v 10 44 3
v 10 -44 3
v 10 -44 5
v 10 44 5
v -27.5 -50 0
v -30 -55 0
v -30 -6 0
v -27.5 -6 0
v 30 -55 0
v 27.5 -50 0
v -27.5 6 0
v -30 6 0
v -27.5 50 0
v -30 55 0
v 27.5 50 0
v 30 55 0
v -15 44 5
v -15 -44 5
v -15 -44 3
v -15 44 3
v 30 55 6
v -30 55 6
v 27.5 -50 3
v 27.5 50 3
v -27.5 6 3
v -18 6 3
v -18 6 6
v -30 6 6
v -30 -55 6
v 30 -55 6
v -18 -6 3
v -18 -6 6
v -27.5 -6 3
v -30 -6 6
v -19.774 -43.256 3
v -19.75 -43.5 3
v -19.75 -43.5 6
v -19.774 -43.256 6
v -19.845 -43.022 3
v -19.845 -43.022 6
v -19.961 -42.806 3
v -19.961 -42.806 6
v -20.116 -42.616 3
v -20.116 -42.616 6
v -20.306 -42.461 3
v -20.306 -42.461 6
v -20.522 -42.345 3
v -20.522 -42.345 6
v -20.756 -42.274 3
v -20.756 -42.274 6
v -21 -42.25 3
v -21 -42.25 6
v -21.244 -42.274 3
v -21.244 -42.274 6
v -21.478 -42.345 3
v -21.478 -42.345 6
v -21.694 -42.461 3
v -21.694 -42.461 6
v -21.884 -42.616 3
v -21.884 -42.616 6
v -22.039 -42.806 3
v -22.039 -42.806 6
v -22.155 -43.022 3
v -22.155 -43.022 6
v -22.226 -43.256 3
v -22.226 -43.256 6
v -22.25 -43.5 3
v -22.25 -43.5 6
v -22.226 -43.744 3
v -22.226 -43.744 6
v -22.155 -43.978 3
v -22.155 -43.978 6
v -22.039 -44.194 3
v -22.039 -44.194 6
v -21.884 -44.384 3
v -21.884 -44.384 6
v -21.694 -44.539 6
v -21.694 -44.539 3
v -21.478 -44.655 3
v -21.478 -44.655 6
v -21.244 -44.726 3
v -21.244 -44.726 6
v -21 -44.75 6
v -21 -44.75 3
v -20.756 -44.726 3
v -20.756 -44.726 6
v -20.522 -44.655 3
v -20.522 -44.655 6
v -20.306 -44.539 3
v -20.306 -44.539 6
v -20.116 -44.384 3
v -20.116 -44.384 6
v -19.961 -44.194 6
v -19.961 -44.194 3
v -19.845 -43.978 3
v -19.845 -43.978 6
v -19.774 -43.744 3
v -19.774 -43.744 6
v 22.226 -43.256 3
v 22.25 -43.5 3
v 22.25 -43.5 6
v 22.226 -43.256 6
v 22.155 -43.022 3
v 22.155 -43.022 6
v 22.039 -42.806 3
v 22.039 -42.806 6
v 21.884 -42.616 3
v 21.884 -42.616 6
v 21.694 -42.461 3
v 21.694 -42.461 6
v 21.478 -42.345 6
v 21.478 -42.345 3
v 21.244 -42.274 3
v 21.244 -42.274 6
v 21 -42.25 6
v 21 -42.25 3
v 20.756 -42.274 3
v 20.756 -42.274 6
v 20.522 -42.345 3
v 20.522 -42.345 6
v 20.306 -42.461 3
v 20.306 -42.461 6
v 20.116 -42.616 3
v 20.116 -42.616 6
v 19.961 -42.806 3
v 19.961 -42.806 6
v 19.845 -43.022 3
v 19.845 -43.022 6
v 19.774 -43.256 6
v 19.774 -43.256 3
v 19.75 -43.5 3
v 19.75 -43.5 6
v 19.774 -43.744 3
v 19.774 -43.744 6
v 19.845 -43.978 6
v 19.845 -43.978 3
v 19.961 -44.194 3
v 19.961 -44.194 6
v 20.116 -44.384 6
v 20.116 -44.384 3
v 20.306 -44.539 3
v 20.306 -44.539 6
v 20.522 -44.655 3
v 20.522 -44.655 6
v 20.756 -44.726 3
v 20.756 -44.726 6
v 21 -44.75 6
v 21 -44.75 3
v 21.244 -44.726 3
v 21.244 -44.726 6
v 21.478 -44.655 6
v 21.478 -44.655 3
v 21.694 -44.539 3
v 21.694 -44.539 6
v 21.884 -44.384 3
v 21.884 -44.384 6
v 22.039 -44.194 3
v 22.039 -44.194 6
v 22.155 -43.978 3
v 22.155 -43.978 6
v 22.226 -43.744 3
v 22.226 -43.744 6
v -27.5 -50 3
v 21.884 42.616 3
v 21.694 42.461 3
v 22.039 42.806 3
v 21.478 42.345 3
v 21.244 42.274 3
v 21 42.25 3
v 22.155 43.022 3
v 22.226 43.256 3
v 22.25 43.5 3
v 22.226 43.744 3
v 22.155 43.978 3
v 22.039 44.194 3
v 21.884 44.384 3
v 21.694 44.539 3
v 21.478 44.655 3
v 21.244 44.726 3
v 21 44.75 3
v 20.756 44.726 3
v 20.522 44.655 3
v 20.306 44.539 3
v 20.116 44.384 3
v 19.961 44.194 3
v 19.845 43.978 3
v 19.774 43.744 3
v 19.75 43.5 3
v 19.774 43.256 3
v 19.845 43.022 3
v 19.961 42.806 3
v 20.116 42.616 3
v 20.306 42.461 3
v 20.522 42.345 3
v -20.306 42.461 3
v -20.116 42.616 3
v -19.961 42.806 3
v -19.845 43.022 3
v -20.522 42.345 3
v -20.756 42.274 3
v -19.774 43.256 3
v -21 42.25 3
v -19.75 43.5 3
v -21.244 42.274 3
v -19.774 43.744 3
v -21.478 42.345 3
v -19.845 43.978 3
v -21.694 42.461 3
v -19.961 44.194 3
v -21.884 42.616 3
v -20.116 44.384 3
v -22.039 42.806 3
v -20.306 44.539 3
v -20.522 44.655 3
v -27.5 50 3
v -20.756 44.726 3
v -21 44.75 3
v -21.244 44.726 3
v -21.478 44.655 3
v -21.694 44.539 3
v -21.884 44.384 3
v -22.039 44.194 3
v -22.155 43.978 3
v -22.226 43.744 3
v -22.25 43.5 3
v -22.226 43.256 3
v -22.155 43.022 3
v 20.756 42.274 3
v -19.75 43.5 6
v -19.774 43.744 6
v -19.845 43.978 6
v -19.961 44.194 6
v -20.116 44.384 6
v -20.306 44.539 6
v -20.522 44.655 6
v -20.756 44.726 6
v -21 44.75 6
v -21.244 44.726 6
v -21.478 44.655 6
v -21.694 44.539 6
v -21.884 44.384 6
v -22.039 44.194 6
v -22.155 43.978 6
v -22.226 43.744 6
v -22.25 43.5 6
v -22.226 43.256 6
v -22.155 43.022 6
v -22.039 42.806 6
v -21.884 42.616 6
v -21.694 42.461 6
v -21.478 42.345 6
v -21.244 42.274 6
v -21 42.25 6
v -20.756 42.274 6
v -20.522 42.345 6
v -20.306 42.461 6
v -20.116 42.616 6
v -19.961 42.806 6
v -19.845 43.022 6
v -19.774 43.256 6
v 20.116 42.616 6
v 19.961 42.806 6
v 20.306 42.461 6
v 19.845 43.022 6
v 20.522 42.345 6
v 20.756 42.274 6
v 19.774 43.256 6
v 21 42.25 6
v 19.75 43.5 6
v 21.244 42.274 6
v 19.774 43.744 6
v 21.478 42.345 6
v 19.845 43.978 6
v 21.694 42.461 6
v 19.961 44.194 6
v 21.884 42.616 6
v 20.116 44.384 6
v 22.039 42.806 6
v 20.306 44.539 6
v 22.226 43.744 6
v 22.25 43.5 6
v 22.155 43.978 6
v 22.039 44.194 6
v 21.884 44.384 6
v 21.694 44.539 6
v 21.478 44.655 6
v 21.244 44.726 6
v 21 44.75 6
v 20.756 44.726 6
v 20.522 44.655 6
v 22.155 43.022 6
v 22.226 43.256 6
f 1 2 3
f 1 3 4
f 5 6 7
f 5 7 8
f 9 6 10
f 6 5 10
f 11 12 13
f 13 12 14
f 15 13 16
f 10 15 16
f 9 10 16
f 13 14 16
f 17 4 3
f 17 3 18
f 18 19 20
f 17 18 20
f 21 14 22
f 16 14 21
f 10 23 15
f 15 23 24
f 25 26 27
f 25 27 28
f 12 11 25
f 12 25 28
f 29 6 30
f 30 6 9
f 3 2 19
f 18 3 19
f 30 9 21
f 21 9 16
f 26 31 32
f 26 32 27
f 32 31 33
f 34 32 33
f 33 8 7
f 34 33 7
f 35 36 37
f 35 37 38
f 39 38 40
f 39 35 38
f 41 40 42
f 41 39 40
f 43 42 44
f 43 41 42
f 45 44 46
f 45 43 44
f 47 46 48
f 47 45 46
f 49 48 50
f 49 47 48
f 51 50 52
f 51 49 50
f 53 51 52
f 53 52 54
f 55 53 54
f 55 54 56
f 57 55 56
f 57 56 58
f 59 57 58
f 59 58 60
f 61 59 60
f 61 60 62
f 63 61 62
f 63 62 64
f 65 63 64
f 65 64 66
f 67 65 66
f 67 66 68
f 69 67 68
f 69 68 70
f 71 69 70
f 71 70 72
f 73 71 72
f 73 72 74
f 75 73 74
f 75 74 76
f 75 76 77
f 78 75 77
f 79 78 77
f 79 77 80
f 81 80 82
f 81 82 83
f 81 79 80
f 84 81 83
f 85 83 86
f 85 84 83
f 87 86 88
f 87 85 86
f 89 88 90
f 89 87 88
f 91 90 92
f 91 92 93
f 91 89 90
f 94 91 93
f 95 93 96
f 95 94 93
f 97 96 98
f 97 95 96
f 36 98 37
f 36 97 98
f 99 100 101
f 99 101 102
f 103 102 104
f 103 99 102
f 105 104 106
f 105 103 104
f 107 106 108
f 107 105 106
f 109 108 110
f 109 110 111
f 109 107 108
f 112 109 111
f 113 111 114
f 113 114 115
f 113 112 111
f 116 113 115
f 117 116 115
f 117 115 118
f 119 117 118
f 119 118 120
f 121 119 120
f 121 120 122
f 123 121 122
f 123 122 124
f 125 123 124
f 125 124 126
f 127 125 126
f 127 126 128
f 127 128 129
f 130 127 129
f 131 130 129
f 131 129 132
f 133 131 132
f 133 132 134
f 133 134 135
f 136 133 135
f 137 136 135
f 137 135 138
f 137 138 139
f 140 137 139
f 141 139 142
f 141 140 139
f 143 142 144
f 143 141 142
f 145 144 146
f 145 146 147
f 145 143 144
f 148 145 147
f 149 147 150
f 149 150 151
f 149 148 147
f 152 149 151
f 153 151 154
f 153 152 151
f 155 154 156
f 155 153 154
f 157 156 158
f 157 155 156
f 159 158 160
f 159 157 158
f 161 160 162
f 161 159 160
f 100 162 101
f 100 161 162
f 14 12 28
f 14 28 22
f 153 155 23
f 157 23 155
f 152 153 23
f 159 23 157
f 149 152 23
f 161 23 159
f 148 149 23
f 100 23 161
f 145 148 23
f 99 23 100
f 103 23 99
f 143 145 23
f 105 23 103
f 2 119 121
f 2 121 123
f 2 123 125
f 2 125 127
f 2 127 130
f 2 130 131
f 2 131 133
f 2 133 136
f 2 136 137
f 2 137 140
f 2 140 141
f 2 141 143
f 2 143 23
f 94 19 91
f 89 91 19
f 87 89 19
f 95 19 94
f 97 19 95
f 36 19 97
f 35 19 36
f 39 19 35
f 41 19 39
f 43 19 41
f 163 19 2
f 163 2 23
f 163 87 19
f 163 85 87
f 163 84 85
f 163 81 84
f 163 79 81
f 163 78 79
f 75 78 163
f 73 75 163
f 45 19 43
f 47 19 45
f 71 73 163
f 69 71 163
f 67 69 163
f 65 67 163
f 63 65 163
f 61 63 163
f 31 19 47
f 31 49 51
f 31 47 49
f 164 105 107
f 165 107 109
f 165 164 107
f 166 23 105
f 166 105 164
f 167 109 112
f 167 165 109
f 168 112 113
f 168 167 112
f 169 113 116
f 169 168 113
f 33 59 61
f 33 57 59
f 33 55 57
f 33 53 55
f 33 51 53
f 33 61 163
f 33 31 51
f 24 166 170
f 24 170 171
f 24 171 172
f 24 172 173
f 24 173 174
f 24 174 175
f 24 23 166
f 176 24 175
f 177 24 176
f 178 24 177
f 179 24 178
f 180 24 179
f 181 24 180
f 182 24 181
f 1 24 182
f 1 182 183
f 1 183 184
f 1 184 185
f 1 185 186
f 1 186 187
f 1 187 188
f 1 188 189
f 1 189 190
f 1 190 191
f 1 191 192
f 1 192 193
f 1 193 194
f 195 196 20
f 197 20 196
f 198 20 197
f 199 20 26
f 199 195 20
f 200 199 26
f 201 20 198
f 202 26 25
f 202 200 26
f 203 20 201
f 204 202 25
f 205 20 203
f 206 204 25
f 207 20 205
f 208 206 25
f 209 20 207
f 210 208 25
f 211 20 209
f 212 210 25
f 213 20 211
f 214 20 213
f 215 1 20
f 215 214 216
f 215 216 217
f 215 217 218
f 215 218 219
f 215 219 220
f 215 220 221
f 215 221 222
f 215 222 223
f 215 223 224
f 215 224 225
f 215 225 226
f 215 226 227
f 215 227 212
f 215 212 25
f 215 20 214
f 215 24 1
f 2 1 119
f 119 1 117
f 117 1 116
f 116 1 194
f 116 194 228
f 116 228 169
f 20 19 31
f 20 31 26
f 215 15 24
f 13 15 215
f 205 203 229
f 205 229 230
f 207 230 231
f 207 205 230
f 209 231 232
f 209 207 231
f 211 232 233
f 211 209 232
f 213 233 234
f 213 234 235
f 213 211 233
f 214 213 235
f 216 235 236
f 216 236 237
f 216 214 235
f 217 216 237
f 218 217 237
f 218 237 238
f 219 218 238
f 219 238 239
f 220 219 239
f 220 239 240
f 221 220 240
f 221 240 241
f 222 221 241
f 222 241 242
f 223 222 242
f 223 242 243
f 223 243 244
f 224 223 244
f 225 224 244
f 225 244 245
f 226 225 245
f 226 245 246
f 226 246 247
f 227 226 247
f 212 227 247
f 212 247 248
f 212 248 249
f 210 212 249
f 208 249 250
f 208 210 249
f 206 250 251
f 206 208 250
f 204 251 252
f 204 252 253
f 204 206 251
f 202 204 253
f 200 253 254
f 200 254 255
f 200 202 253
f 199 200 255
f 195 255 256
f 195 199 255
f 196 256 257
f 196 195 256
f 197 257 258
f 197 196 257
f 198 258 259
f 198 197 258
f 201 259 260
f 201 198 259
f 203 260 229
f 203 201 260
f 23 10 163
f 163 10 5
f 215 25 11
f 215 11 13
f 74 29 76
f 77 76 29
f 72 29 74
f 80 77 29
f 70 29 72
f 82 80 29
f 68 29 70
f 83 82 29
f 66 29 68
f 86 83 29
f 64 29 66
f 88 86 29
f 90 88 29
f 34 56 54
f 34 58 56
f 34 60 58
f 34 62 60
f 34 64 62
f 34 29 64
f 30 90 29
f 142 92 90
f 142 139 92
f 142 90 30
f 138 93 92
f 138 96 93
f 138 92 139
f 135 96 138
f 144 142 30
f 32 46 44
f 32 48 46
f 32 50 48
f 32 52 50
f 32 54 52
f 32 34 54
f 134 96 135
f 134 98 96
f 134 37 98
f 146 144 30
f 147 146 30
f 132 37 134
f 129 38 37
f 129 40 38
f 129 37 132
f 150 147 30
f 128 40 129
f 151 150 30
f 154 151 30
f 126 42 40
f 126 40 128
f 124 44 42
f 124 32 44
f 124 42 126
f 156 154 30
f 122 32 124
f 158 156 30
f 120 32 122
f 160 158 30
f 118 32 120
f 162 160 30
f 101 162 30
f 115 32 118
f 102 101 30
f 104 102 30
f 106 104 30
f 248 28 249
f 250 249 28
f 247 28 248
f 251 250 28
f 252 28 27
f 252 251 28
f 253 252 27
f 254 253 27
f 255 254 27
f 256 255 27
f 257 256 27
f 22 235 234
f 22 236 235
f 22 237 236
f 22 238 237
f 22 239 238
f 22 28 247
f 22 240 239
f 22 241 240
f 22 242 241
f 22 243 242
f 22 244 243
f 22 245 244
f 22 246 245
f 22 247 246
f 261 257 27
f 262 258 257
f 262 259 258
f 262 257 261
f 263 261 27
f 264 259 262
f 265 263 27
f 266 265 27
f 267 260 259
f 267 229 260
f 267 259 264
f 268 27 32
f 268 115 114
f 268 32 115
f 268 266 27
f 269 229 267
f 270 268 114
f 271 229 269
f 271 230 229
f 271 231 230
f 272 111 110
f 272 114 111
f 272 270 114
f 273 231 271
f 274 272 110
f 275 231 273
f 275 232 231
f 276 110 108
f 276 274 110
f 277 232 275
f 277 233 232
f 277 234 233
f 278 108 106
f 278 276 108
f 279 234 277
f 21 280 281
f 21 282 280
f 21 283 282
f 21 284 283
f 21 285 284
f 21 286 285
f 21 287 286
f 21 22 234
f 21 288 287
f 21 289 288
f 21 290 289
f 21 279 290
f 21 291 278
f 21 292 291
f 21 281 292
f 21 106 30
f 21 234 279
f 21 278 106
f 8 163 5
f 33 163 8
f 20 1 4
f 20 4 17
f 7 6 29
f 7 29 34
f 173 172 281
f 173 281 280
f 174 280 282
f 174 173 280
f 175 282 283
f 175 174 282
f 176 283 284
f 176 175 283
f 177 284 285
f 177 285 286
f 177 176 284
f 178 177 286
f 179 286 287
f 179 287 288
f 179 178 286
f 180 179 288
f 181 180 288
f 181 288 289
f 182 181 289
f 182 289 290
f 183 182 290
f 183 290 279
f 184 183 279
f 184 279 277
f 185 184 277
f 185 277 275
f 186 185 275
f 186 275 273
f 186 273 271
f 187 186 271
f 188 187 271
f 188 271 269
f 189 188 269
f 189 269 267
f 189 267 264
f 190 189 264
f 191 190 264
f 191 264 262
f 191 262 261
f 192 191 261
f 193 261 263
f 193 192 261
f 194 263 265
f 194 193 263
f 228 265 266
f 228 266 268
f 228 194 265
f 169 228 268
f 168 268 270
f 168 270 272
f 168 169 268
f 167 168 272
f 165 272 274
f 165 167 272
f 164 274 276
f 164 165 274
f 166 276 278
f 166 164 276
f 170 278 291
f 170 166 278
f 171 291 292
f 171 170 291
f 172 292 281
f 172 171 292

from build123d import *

# Parameters (mm, degrees)
SKETCH_1_W          = 60
SKETCH_1_H          = 110
SKETCH_1_W_2        = 50
SKETCH_1_H_2        = 100
SKETCH_1_R          = 1.25
EXTRUDE_1_DEPTH     = 6
SKETCH_3_W          = 5
SKETCH_3_H          = 12
SKETCH_3_W_2        = 50
SKETCH_3_H_2        = 100
SKETCH_3_R          = 1.25
CUT_EXTRUDE_2_DEPTH = 3
SKETCH_4_W          = 25
SKETCH_4_H          = 88
CUT_EXTRUDE_3_DEPTH = 2
SKETCH_5_W          = 12
SKETCH_5_H          = 12
CUT_EXTRUDE_4_DEPTH = 63.721607122
SKETCH_6_W          = 55
SKETCH_6_H          = 100
CUT_EXTRUDE_5_DEPTH = 63.721607122


with BuildPart() as part:
    # 草图1 → 凸台-拉伸1 (new body)
    # profile 1 of 2: a face of its own
    with BuildSketch(Plane.XY):
        Rectangle(SKETCH_1_W, SKETCH_1_H)
        Rectangle(SKETCH_1_W_2, SKETCH_1_H_2, mode=Mode.SUBTRACT)
    # profile 2 of 2: a face of its own
    with BuildSketch(Plane.XY):
        Rectangle(SKETCH_1_W_2, SKETCH_1_H_2)
        with Locations((21, -43.5)):
            Circle(SKETCH_1_R, mode=Mode.SUBTRACT)
        with Locations((-21, -43.5)):
            Circle(SKETCH_1_R, mode=Mode.SUBTRACT)
        with Locations((21, 43.5)):
            Circle(SKETCH_1_R, mode=Mode.SUBTRACT)
        with Locations((-21, 43.5)):
            Circle(SKETCH_1_R, mode=Mode.SUBTRACT)
    extrude(amount=EXTRUDE_1_DEPTH)

    # 草图3 → 切除-拉伸2 (cut)
    # profile 1 of 2: a face of its own
    with BuildSketch(Plane(origin=(0, 0, 0), x_dir=(-1, 0, 0), z_dir=(0, 0, -1))):
        with Locations((27.5, 0)):
            Rectangle(SKETCH_3_W, SKETCH_3_H)
    # profile 2 of 2: a face of its own
    with BuildSketch(Plane(origin=(0, 0, 0), x_dir=(-1, 0, 0), z_dir=(0, 0, -1))):
        Rectangle(SKETCH_3_W_2, SKETCH_3_H_2)
        with Locations((21, -43.5)):
            Circle(SKETCH_3_R, mode=Mode.SUBTRACT)
        with Locations((21, 43.5)):
            Circle(SKETCH_3_R, mode=Mode.SUBTRACT)
        with Locations((-21, 43.5)):
            Circle(SKETCH_3_R, mode=Mode.SUBTRACT)
        with Locations((-21, -43.5)):
            Circle(SKETCH_3_R, mode=Mode.SUBTRACT)
    extrude(amount=-CUT_EXTRUDE_2_DEPTH, mode=Mode.SUBTRACT)

    # 草图4 → 切除-拉伸3 (cut)
    with BuildSketch(Plane(origin=(0, 0, 3), x_dir=(-1, 0, 0), z_dir=(0, 0, -1))):
        with Locations((2.5, 0)):
            Rectangle(SKETCH_4_W, SKETCH_4_H)
    extrude(amount=-CUT_EXTRUDE_3_DEPTH, mode=Mode.SUBTRACT)

    # 草图5 → 切除-拉伸4 (cut, through all)
    with BuildSketch(Plane(origin=(0, 0, 3), x_dir=(-1, 0, 0), z_dir=(0, 0, -1))):
        with Locations((24, 0)):
            Rectangle(SKETCH_5_W, SKETCH_5_H)
    extrude(amount=-CUT_EXTRUDE_4_DEPTH, mode=Mode.SUBTRACT)

    # 草图6 → 切除-拉伸5 (cut, through all)
    with BuildSketch(Plane(origin=(0, 0, 3), x_dir=(-1, 0, 0), z_dir=(0, 0, -1))):
        Rectangle(SKETCH_6_W, SKETCH_6_H)
    extrude(amount=CUT_EXTRUDE_5_DEPTH, mode=Mode.SUBTRACT)


solid = part.part
